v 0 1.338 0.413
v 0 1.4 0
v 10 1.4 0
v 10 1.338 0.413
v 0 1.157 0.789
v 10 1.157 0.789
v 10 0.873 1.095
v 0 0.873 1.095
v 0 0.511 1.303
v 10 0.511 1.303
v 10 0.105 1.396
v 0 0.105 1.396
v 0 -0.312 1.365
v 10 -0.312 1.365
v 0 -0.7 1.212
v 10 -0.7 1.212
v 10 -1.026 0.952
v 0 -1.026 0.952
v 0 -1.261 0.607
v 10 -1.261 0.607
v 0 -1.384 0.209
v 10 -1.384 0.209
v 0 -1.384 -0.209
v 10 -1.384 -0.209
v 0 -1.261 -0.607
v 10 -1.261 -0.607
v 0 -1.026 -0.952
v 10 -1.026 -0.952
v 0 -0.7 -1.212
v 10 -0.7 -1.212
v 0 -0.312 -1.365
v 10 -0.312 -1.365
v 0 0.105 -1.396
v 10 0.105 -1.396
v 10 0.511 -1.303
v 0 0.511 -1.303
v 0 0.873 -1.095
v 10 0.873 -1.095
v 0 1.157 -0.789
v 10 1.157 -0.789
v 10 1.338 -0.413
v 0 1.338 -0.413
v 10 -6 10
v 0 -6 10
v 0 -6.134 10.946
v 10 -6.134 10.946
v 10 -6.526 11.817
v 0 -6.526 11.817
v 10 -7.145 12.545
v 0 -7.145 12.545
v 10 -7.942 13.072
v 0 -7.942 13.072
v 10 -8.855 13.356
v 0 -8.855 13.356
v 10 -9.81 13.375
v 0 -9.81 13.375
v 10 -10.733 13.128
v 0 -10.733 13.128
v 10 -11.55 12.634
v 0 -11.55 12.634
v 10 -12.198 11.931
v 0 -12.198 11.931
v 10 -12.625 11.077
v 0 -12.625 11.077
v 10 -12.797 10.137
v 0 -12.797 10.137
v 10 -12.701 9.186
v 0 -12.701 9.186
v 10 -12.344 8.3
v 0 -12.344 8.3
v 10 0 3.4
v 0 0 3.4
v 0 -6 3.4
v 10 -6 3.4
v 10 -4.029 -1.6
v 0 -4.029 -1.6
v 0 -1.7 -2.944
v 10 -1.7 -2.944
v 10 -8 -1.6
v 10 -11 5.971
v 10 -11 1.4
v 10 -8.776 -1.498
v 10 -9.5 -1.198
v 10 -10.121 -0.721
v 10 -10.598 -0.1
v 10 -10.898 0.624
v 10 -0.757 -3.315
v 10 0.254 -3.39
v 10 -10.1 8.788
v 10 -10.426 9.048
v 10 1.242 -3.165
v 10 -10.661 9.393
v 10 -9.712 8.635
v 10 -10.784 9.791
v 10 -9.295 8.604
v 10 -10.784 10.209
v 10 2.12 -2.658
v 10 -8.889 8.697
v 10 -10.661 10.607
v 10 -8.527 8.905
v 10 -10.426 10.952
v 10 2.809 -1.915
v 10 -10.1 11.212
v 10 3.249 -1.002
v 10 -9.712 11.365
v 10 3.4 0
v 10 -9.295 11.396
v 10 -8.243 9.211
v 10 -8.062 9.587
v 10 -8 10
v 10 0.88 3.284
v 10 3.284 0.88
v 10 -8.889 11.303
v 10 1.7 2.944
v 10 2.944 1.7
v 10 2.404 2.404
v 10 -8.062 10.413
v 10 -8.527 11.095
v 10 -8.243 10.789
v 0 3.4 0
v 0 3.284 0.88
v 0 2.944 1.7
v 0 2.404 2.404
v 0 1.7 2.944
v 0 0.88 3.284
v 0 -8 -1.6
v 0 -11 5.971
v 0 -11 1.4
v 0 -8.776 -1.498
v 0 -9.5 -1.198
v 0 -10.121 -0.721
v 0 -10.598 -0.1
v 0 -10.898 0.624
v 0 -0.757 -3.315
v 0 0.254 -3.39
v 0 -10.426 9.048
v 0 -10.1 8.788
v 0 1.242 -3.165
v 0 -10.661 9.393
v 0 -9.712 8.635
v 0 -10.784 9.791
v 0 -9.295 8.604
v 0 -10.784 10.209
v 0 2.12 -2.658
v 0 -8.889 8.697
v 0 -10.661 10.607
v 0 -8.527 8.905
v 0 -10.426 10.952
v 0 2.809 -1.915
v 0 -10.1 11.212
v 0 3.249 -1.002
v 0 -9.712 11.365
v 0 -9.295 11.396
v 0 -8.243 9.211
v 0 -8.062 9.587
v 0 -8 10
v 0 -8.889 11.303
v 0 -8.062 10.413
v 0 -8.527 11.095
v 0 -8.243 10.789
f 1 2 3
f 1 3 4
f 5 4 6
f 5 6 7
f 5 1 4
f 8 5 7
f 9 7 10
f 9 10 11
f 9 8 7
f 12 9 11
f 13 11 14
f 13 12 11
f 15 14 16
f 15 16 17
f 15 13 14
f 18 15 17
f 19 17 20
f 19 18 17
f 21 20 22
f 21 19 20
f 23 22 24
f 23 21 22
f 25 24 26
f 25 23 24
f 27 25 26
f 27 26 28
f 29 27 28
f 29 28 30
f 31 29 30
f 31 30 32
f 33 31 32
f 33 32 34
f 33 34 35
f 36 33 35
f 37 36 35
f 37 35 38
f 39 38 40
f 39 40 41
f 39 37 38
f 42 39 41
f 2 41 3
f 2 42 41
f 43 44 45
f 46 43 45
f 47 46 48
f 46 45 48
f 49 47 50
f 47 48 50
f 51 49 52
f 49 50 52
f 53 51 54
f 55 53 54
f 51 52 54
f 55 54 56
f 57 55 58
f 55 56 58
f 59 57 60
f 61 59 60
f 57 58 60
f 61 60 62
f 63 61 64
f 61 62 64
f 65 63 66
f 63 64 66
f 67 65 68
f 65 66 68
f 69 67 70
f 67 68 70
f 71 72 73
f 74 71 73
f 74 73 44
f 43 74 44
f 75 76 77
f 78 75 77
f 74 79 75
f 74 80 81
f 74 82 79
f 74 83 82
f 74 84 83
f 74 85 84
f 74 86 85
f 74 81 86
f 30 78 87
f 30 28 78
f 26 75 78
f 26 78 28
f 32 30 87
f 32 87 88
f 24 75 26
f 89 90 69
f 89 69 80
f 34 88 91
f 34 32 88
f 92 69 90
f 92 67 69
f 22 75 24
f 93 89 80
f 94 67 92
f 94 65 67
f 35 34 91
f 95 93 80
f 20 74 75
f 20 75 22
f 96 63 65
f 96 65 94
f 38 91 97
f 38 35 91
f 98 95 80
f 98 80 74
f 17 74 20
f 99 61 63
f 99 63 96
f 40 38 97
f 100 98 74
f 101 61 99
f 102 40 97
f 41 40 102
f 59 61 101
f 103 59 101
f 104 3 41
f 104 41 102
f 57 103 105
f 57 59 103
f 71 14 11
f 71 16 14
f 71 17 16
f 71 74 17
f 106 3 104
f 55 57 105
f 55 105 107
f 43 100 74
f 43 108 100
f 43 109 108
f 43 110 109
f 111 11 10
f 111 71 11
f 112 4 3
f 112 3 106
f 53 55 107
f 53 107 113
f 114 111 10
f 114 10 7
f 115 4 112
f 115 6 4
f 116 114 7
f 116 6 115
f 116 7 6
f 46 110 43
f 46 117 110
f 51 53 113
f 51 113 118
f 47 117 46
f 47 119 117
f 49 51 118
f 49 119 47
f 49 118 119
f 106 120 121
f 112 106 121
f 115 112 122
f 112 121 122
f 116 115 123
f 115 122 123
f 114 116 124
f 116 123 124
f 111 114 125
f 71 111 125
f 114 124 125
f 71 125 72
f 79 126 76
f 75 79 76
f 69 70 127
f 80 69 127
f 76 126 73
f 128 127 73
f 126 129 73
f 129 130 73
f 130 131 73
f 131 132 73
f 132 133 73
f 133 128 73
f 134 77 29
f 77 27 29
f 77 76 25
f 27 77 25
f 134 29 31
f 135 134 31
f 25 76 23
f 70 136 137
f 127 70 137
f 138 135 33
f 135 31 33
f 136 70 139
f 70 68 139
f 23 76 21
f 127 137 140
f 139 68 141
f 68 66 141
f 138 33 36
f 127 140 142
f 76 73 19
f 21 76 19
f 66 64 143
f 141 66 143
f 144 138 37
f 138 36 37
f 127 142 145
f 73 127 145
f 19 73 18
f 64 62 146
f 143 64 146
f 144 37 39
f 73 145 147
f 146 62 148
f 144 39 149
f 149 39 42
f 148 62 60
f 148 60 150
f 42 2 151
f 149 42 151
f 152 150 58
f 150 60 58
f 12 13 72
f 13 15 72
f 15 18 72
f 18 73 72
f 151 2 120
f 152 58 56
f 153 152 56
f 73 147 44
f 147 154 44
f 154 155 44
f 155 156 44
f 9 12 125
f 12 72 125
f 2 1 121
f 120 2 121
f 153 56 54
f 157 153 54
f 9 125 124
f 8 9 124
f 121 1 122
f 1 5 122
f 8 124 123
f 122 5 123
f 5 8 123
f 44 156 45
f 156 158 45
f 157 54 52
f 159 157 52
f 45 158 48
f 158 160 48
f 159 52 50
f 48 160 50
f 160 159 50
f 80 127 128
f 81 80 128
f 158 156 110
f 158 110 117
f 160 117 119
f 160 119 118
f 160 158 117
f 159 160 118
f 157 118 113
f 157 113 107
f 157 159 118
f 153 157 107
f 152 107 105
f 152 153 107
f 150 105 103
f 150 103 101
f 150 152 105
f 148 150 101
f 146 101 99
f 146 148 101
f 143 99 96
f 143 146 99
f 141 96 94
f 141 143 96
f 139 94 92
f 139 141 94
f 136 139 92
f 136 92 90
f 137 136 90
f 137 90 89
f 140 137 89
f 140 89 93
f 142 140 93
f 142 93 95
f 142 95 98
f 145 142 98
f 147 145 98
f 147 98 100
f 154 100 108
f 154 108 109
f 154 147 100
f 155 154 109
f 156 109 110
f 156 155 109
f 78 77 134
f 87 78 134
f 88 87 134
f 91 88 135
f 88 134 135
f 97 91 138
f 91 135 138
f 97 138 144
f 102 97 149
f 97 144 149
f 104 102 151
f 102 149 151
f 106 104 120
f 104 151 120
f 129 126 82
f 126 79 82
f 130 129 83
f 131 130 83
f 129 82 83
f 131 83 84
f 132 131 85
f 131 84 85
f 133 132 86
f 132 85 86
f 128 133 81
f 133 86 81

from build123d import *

# Parameters (mm, degrees)
F0_R     = 1.4
F1_DEPTH = 10
F2_R     = 3


with BuildPart() as f1:
    # F0 (on Right) → F1 (new body)
    with BuildSketch(Plane.YZ):
        with BuildLine():
            ThreePointArc((-1.7, -2.944486), (1.7, -2.944486), (3.4, 0))
            ThreePointArc((3.4, 0), (2.404163, 2.404163), (0, 3.4))
            ThreePointArc((0, 3.4), (-3.284148, 0.879985), (-1.7, -2.944486))
        make_face()
        Circle(F0_R, mode=Mode.SUBTRACT)
        with BuildLine():
            ThreePointArc((-1.7, -2.944486), (-3.284148, 0.879985), (0, 3.4))
            Line((0, 3.4), (-6, 3.4))
            Line((-6, 3.4), (-6, 10))
            ThreePointArc((-6, 10), (-8.520015, 6.715852), (-12.344486, 8.3))
            Line((-12.344486, 8.3), (-11, 5.971281))
            Line((-11, 5.971281), (-11, -1.6))
            Line((-11, -1.6), (-4.028719, -1.6))
            Line((-4.028719, -1.6), (-1.7, -2.944486))
        make_face()
        with BuildLine():
            ThreePointArc((-12.344486, 8.3), (-8.520015, 6.715852), (-6, 10))
            ThreePointArc((-6, 10), (-10.279985, 13.284148), (-12.344486, 8.3))
        make_face()
        with Locations((-9.4, 10)):
            Circle(F0_R, mode=Mode.SUBTRACT)
    extrude(amount=F1_DEPTH)

    # F2
    f2_edges = [f1.edges().sort_by_distance(p)[0] for p in [
        (5, -11, -1.6),
    ]]
    fillet(f2_edges, radius=F2_R)


solid = f1.part
